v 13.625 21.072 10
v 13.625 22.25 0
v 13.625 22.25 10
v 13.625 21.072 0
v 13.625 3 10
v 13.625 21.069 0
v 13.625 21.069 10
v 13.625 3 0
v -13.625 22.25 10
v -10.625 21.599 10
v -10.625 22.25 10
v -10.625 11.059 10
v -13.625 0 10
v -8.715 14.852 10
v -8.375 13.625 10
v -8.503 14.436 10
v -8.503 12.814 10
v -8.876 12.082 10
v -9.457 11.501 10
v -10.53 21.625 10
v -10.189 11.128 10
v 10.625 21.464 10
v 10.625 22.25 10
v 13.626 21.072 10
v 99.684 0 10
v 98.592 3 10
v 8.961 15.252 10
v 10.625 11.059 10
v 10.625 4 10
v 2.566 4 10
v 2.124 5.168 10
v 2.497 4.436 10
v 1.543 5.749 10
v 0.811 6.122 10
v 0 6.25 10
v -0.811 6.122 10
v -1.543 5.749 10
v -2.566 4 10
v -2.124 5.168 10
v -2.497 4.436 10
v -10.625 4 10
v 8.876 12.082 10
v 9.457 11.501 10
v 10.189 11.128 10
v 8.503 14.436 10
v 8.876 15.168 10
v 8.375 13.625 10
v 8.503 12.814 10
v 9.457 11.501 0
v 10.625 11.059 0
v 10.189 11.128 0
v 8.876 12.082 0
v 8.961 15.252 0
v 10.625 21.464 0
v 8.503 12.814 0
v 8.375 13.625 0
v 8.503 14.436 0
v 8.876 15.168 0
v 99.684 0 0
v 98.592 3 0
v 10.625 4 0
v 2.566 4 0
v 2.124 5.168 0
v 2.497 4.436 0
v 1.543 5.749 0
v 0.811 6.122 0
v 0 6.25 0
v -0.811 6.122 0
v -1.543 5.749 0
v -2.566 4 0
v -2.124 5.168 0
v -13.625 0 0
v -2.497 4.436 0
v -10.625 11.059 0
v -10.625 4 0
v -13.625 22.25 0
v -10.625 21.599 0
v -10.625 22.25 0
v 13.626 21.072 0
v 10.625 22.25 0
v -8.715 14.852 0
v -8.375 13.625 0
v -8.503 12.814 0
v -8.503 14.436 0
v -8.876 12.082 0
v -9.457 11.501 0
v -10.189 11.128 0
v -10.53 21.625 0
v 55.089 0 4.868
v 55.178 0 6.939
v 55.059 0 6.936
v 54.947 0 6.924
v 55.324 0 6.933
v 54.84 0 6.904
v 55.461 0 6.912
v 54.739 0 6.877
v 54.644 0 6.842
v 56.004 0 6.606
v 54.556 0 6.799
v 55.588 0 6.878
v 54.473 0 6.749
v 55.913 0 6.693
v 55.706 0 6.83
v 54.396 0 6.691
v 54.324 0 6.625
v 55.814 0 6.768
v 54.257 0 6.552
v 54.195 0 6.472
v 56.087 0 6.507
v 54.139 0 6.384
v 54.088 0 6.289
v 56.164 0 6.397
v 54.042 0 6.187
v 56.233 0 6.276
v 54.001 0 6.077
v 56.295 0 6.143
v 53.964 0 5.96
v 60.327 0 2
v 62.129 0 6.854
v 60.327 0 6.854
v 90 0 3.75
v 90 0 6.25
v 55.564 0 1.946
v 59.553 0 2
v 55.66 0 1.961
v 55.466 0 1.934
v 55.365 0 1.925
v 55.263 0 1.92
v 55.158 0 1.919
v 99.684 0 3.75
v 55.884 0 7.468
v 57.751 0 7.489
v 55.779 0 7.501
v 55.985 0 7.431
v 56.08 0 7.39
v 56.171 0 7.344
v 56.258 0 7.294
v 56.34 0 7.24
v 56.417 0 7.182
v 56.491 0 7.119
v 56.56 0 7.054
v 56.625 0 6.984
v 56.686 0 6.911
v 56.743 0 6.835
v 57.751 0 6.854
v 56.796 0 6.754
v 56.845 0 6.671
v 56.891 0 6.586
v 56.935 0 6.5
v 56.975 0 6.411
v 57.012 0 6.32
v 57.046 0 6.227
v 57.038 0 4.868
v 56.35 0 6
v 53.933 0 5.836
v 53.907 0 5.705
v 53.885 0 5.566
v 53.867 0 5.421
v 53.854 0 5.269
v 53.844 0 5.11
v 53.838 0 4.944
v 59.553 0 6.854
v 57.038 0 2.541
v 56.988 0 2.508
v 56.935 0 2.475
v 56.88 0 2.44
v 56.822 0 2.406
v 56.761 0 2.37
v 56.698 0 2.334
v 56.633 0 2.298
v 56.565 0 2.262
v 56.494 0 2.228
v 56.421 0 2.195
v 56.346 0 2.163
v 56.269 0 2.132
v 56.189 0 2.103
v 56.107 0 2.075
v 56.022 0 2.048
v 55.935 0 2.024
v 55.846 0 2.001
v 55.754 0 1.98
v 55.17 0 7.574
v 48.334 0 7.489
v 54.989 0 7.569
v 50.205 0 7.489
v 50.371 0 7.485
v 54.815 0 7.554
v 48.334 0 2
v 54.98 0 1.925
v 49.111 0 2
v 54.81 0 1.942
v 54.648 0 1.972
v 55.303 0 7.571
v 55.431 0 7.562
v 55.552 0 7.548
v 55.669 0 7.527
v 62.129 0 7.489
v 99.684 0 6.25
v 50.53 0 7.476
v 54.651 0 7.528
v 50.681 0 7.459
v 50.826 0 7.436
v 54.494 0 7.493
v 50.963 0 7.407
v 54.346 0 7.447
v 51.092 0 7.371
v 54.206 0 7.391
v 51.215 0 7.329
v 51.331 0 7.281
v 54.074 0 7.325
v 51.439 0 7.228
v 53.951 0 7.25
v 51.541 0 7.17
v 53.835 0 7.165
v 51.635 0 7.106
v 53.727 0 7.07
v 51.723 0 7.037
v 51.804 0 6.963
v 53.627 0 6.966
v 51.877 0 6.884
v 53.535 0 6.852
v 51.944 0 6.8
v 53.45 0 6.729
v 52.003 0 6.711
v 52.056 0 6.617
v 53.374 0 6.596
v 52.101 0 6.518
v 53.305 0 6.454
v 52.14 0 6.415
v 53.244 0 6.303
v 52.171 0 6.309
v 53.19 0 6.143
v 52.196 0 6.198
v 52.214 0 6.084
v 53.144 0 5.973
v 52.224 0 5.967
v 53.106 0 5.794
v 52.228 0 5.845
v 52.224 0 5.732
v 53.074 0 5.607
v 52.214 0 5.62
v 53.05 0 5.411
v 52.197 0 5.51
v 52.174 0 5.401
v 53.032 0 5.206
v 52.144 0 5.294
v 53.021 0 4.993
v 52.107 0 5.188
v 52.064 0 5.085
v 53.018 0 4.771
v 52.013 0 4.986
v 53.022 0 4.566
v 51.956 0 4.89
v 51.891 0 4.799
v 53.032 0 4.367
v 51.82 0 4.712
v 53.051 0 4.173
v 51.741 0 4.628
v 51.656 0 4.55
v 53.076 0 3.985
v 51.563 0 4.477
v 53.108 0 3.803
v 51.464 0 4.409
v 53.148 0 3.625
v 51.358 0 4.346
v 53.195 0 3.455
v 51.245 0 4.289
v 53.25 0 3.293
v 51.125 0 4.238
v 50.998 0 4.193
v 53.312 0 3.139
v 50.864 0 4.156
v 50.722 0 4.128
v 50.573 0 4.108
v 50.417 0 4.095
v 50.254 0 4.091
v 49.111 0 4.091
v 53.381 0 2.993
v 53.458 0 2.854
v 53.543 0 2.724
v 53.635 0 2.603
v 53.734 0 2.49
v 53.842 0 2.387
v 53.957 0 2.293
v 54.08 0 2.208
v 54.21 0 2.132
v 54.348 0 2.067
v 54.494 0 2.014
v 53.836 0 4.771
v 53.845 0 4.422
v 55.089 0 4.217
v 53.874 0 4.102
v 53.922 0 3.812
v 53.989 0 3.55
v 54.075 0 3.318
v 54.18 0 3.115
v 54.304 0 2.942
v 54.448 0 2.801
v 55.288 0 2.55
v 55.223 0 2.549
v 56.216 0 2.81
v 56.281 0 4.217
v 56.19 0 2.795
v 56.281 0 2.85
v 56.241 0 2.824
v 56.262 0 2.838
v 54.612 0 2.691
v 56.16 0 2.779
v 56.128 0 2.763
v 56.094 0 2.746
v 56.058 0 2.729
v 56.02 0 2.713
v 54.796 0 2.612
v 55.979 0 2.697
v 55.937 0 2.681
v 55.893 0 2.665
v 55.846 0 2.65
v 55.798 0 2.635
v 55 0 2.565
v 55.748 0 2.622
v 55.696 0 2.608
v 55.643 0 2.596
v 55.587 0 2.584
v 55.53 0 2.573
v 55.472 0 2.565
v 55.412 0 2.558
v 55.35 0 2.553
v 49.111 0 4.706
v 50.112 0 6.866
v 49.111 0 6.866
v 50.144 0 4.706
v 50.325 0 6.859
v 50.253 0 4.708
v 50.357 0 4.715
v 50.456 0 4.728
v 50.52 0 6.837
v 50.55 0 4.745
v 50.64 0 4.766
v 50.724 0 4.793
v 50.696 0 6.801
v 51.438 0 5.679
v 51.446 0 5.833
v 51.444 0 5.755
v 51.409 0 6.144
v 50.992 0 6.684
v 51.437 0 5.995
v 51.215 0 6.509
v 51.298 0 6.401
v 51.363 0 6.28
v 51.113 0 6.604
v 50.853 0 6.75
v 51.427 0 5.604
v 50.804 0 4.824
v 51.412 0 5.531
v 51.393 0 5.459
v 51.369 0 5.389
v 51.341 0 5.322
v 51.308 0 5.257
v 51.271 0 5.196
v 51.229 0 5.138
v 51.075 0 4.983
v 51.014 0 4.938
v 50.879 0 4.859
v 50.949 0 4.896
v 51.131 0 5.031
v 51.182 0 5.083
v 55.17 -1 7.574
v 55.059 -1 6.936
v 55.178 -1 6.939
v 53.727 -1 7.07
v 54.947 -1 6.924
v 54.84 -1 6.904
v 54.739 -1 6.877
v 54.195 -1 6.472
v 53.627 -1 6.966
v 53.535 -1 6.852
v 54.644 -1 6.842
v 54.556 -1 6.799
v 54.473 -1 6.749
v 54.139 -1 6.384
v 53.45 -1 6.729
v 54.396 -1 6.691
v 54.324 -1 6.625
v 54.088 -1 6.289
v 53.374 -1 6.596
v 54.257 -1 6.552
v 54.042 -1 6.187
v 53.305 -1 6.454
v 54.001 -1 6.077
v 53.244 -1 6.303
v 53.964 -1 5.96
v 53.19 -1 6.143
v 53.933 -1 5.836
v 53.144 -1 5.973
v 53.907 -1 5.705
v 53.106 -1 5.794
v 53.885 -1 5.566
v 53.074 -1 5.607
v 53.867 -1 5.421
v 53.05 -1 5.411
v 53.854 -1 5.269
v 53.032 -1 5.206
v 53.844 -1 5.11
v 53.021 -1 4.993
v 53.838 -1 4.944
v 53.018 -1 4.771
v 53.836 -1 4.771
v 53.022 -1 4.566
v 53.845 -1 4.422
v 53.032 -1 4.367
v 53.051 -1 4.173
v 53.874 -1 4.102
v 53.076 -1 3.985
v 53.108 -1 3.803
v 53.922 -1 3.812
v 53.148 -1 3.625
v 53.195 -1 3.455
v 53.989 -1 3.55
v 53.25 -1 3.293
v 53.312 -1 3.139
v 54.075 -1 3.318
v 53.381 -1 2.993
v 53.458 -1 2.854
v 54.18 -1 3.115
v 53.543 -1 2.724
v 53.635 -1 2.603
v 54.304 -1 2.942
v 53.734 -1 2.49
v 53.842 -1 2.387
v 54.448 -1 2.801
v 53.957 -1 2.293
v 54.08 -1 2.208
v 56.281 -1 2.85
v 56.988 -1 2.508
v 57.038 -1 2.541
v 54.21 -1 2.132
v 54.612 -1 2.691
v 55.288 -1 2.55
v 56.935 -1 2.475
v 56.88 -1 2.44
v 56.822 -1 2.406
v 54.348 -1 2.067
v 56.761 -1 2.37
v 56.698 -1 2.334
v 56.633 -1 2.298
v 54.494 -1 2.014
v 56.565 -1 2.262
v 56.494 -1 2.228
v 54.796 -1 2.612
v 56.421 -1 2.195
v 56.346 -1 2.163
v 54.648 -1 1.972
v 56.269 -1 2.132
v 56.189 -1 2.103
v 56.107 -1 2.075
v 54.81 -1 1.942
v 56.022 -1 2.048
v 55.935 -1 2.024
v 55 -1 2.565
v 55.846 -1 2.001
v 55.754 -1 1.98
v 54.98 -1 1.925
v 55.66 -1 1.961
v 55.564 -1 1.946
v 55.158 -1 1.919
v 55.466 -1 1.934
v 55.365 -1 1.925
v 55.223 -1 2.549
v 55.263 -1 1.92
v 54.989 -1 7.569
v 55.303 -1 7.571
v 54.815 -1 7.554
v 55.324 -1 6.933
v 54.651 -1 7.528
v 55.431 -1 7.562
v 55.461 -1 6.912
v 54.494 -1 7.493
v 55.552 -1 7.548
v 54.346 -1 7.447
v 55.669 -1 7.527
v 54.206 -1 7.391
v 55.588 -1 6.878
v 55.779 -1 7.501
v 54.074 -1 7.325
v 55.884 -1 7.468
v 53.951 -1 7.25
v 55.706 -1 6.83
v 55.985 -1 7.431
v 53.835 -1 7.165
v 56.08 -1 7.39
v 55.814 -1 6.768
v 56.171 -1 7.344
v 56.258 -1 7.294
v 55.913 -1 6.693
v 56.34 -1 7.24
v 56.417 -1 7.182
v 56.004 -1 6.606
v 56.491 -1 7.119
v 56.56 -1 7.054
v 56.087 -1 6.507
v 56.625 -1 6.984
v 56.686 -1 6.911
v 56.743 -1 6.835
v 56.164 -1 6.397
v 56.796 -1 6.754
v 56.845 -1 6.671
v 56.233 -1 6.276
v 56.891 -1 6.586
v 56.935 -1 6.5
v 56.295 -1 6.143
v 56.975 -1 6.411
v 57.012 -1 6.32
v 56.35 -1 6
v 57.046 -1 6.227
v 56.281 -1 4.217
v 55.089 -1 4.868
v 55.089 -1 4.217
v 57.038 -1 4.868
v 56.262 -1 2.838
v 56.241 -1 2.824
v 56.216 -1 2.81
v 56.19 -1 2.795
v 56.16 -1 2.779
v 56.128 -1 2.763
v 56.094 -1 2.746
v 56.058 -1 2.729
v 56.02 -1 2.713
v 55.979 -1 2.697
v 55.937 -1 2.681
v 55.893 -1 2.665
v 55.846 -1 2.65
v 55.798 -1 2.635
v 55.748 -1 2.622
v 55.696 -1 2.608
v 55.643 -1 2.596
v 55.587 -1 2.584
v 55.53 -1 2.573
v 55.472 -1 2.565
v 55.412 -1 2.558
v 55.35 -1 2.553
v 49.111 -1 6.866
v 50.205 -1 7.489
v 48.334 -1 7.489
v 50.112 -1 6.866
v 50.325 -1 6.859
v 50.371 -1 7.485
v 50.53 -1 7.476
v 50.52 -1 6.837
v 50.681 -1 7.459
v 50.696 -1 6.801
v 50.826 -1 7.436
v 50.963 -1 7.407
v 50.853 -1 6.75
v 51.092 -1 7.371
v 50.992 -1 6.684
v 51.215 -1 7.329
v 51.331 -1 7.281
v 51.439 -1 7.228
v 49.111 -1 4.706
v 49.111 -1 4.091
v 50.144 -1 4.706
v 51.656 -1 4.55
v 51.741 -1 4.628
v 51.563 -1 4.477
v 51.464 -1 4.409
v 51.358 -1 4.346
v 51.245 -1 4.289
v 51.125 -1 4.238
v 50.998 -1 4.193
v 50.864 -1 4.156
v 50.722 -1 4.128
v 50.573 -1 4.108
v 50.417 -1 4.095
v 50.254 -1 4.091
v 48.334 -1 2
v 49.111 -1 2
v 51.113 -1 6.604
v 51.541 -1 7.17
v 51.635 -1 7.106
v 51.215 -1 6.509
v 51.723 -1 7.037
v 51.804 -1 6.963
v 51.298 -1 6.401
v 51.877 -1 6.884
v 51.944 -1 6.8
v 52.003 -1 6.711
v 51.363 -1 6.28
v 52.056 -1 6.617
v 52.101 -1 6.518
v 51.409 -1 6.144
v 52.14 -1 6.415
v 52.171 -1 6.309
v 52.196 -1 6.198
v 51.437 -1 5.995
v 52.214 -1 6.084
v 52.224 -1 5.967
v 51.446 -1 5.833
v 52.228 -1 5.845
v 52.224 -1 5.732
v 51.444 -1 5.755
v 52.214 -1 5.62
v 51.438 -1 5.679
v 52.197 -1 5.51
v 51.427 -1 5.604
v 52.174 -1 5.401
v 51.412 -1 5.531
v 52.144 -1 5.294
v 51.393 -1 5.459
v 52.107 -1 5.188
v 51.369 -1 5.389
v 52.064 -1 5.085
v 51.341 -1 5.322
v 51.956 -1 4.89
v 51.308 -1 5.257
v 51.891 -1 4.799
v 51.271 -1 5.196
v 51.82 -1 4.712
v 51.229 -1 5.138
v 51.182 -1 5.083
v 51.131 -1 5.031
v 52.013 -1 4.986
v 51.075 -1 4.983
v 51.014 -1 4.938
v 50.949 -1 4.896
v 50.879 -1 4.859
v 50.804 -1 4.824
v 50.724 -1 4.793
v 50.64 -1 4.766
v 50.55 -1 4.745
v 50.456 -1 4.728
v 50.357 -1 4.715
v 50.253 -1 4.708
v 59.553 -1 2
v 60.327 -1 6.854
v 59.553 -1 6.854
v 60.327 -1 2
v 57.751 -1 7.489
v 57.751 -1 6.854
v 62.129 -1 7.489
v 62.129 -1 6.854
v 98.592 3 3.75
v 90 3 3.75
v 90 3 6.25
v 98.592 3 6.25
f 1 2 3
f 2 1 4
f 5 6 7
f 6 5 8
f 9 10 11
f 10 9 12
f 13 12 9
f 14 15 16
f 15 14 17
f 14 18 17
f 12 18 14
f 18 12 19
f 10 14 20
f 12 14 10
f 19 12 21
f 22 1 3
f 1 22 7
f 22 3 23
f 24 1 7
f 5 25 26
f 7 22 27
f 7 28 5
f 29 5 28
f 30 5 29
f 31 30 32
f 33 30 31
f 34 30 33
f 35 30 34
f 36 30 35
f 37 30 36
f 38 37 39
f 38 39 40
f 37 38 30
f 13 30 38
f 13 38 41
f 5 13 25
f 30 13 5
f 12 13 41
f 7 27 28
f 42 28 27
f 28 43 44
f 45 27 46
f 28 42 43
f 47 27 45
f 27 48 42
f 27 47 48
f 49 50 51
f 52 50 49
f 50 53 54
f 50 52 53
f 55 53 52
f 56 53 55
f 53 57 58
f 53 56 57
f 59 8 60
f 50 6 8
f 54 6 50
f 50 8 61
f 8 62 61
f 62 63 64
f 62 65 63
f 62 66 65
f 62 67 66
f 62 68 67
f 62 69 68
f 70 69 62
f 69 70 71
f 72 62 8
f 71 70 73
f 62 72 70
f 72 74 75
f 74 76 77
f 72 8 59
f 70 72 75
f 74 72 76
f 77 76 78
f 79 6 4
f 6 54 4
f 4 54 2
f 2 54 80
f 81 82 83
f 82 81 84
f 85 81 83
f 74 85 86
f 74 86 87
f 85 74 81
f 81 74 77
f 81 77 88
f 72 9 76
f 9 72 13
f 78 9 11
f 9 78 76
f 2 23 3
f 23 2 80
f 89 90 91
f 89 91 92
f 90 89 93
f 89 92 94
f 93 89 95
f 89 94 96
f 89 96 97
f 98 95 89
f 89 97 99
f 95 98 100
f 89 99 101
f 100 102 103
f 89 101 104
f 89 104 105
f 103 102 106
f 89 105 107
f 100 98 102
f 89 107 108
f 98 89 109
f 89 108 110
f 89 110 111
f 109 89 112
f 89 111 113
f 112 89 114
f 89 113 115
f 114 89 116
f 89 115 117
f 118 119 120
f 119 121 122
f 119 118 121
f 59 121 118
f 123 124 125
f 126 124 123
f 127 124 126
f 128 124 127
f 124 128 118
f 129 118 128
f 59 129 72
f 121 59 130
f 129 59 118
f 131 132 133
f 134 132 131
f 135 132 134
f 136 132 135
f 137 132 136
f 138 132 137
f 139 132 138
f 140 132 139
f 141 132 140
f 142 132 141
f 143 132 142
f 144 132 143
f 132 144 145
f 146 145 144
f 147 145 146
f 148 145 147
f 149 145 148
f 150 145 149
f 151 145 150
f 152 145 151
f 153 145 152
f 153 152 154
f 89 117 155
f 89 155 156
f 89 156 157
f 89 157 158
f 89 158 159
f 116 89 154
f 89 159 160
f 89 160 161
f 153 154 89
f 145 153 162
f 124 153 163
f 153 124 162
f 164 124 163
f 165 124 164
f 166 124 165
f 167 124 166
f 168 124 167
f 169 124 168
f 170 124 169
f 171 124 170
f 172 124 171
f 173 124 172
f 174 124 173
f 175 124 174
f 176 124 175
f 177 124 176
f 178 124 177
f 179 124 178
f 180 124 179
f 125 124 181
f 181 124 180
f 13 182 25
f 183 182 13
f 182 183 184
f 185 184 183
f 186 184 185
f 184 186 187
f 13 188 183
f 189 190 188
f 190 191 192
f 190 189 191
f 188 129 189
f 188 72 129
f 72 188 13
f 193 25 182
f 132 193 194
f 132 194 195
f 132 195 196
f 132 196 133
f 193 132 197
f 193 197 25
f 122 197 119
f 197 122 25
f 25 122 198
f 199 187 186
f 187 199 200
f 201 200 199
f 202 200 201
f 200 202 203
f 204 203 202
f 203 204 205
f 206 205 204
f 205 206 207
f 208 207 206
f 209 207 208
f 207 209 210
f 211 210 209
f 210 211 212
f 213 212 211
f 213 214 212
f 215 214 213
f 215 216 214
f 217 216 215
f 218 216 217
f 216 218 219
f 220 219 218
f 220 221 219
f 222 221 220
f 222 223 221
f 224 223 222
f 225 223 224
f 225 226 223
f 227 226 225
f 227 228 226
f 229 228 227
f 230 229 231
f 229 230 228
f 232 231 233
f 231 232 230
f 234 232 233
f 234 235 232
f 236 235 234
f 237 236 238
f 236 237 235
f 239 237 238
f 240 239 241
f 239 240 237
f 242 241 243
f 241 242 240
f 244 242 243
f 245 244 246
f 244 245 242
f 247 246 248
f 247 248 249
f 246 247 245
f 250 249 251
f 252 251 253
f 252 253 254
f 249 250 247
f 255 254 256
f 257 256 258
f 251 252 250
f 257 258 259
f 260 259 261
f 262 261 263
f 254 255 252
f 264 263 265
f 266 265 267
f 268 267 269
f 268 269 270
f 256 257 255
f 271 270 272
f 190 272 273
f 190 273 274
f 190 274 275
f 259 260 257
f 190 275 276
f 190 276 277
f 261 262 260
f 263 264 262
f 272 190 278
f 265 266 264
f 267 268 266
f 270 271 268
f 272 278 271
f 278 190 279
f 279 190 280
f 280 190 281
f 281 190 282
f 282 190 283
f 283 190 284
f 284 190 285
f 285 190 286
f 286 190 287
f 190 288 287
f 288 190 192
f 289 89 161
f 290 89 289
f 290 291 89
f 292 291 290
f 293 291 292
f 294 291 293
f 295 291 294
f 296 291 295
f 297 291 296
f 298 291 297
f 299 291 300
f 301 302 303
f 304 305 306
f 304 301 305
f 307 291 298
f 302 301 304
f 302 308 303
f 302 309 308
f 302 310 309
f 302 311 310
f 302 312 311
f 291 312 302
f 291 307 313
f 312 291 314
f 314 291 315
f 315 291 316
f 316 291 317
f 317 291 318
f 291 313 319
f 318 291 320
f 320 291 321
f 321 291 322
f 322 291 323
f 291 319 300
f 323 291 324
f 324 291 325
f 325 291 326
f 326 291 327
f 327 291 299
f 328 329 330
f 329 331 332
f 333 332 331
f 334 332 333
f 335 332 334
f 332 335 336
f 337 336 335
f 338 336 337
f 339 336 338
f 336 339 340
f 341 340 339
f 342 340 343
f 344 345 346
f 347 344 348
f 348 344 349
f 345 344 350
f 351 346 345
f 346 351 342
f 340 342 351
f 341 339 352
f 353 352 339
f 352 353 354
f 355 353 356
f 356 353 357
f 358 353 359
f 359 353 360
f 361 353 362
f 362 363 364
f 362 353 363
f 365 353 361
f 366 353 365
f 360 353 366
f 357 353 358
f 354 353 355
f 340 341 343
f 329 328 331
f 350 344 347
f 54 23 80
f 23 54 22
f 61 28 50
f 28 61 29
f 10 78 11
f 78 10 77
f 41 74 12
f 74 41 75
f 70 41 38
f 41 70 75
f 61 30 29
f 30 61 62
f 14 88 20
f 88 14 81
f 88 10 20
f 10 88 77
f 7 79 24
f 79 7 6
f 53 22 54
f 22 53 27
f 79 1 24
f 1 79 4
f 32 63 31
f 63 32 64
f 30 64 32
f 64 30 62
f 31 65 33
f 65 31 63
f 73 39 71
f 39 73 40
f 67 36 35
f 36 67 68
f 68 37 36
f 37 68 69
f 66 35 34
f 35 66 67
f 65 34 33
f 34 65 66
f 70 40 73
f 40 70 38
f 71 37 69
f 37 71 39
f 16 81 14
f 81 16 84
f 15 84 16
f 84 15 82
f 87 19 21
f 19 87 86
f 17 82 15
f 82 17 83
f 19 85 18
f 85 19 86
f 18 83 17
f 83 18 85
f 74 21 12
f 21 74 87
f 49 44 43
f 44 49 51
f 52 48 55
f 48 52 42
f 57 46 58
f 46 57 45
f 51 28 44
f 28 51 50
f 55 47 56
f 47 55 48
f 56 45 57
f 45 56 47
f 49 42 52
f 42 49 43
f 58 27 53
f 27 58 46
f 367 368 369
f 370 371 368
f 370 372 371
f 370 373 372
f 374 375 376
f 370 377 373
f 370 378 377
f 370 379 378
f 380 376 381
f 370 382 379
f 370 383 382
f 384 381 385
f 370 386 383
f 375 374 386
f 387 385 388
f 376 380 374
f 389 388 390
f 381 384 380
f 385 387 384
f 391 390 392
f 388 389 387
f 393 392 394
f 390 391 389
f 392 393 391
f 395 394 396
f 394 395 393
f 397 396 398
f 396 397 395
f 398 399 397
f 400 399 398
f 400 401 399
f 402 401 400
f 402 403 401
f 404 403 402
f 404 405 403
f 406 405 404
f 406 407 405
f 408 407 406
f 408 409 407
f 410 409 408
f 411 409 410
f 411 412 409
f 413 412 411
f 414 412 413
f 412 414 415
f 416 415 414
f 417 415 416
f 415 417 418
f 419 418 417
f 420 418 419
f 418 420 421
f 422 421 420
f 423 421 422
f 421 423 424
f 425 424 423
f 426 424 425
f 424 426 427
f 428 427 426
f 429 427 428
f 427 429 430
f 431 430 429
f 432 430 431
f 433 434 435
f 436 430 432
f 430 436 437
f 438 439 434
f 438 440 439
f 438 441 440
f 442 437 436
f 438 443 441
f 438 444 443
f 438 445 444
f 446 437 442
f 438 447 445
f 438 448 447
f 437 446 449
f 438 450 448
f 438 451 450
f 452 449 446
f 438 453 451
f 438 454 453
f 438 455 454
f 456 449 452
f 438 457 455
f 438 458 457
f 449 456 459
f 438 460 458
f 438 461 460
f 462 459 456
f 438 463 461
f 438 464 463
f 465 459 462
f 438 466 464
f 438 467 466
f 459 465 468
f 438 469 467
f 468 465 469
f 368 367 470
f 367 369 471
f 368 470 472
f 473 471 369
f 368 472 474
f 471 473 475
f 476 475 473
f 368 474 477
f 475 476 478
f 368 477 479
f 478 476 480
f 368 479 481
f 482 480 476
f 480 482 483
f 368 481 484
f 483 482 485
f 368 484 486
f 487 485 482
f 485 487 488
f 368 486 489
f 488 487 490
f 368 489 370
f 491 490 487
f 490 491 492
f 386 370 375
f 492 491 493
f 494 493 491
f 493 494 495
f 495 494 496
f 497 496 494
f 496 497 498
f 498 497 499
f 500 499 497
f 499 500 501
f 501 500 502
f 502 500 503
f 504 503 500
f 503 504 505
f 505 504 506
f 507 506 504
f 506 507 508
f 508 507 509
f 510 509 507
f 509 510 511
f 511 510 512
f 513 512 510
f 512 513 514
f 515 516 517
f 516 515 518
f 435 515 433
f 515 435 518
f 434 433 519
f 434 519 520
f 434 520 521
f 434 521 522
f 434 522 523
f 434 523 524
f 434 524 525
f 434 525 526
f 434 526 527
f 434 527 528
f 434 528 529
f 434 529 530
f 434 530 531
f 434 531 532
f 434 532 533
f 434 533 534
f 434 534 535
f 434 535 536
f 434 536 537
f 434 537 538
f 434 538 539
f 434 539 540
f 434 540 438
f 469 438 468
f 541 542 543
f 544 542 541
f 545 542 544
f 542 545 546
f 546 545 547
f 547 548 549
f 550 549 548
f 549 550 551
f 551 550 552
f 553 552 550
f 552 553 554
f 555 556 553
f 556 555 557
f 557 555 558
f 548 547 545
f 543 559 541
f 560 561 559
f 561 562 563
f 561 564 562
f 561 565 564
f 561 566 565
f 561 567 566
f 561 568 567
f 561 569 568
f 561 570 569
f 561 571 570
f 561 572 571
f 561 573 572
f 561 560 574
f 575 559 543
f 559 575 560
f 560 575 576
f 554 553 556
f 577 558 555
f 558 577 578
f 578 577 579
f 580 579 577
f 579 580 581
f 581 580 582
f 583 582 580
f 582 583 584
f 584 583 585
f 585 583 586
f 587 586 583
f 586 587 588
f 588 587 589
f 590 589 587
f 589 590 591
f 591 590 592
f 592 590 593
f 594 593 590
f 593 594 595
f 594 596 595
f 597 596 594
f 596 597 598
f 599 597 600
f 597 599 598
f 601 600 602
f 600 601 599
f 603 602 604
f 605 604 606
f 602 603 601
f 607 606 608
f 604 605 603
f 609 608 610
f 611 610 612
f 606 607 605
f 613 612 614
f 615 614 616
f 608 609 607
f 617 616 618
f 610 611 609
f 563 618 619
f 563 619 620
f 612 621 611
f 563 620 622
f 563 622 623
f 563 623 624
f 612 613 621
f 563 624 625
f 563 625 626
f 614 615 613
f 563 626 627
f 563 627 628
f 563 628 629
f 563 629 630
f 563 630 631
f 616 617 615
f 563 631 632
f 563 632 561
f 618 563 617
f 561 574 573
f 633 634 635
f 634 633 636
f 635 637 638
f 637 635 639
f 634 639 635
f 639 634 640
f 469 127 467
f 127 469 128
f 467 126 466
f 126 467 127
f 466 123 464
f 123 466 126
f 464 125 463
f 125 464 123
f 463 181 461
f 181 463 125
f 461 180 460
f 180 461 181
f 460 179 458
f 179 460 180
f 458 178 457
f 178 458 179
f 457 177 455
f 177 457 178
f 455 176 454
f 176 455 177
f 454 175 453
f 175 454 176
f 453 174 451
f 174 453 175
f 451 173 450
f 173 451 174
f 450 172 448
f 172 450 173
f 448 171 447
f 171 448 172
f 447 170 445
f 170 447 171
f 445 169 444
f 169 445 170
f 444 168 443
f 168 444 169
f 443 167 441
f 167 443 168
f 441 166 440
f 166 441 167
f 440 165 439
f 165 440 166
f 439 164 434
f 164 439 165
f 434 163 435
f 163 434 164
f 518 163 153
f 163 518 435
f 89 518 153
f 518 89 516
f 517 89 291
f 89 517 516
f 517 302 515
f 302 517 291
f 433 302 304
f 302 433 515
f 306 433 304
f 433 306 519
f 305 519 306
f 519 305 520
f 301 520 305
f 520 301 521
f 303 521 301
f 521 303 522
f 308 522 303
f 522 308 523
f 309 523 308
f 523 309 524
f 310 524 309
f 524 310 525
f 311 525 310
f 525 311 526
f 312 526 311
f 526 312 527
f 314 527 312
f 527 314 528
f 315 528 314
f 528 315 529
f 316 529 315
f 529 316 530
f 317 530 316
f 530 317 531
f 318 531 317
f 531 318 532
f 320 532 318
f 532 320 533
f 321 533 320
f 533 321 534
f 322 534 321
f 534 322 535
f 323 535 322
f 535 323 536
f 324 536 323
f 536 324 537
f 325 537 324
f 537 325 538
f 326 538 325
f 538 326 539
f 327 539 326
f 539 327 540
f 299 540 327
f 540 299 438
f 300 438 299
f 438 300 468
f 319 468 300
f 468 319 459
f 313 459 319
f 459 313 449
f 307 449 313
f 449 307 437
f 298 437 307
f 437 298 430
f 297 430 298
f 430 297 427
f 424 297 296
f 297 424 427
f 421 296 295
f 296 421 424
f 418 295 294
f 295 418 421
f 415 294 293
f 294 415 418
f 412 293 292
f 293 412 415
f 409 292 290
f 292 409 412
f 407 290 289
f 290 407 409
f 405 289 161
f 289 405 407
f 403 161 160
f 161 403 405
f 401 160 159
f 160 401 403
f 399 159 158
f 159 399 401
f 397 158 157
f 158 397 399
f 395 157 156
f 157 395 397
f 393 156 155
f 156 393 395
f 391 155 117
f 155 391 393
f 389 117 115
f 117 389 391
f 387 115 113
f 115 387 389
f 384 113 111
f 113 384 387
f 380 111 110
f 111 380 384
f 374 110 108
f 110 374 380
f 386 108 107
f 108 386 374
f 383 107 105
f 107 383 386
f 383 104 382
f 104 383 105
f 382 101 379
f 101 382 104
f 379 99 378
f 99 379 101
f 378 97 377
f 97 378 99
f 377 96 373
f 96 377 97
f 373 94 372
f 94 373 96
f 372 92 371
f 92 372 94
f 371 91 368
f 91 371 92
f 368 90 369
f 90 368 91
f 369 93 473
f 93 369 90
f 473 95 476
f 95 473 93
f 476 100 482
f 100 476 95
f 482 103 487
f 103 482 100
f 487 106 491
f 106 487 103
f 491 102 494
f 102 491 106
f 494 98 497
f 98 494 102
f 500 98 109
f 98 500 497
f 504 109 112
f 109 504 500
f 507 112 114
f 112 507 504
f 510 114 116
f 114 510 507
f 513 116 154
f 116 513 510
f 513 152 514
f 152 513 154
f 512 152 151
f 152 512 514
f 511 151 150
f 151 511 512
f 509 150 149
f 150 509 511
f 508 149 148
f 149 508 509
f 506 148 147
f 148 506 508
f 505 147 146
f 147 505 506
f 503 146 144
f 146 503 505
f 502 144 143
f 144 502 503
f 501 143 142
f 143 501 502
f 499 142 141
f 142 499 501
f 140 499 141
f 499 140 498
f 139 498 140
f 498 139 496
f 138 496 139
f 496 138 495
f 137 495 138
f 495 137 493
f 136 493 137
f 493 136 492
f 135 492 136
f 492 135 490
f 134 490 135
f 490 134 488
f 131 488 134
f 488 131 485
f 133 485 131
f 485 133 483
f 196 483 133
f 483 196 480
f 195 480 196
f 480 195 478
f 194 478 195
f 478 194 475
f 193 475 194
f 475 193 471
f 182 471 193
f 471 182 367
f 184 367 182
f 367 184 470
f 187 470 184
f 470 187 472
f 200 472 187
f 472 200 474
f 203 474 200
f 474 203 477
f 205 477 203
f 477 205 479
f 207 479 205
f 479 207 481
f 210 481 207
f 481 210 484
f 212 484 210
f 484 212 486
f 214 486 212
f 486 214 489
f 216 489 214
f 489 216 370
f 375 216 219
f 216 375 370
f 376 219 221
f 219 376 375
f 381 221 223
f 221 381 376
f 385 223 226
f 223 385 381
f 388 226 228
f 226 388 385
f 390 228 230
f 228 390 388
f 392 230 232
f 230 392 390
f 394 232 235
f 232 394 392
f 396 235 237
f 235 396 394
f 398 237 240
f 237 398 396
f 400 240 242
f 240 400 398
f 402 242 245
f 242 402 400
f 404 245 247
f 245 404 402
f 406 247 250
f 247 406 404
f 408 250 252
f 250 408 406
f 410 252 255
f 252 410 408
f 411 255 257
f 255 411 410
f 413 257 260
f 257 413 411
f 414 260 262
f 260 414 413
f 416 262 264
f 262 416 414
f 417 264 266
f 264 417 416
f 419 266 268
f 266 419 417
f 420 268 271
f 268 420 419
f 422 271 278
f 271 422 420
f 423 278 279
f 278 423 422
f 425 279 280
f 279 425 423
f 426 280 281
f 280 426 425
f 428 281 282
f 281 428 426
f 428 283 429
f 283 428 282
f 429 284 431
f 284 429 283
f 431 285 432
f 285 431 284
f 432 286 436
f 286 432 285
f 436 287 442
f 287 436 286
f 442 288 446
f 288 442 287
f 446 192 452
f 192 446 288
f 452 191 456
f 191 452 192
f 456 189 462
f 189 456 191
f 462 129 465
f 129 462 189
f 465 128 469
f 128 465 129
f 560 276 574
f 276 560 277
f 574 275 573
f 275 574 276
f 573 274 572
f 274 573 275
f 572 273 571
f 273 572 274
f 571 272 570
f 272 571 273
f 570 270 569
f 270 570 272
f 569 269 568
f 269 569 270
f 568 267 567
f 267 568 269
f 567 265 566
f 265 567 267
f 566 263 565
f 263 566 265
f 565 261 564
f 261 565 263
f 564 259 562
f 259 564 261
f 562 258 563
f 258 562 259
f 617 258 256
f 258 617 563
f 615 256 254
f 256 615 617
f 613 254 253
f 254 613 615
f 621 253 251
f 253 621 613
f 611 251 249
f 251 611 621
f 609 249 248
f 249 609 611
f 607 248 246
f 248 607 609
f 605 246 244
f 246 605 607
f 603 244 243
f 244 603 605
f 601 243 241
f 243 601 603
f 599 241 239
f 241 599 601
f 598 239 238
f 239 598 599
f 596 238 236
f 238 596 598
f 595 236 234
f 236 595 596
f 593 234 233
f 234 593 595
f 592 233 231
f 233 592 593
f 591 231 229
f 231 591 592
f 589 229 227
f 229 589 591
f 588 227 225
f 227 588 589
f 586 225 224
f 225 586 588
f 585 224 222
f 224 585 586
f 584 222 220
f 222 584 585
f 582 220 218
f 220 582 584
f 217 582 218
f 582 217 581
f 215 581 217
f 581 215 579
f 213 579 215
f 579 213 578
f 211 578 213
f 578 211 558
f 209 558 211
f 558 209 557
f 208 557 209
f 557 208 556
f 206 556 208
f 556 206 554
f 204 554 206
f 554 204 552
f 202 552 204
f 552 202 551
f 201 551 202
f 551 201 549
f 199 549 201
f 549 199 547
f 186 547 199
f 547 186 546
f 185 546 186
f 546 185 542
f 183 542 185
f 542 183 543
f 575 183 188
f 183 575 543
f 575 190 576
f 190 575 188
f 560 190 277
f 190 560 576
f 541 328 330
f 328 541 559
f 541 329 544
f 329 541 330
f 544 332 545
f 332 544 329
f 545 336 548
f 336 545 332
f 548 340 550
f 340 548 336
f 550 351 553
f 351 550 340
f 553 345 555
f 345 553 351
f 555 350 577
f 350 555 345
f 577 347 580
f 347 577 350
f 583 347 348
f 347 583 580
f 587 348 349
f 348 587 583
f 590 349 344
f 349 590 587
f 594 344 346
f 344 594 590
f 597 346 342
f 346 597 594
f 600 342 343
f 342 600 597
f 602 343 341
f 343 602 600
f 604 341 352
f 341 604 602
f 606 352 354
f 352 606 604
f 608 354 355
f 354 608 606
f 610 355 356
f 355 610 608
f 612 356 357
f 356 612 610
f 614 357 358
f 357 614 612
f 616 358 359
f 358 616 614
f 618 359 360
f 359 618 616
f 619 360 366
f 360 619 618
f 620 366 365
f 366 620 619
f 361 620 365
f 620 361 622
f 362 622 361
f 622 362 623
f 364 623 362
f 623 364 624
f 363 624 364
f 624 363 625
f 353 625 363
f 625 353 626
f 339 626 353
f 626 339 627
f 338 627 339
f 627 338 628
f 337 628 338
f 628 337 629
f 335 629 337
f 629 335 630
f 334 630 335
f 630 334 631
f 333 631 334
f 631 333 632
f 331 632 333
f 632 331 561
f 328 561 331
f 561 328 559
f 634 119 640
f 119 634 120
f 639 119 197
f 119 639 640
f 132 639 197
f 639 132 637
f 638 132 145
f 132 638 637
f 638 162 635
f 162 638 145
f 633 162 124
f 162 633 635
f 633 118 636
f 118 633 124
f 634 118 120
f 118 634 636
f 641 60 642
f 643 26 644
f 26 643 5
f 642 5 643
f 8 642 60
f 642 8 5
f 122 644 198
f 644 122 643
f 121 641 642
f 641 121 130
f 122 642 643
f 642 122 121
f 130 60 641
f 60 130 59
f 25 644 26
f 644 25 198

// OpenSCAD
use <text_on.scad>;
$fn=36;

width = 27.25;
height  = 22.25;
depth  = 10.00; // seen from bird's eye view of scad file

side_wall = 3.0;

teeth_y = 20.00;    
teeth_d = 5.25; // diameter

//filament wheel has radius 85mm
protrude_length = 100; // amount to come out of 2020 bar 
support_tip_length = 10;
support_tip_space = 2.5;
support_tip_y = 3;

support_tip_head_width = 50;

font_size = 6;

translate([0,1,0]) rotate([0,0,0]) tool_clip();
// extension
//translate([width/2-1,0,0]) // -1 on x for spacing from rotate
//rotate([0,0,-20])
//union(){
//  color("blue")
//  difference(){
//    translate([protrude_length-support_tip_length,0,depth/2-support_tip_space/2])
//    union(){
//      // support that goes into slot
//      translate([0,0,0.1])
//      cube([support_tip_length,support_tip_y,support_tip_space-0.2]);
//      translate([0,0,-depth/2+support_tip_space/2])
//      // side angles up to tip
//      linear_extrude(height=depth)
//      polygon([[0,0], [support_tip_length,0], [support_tip_length+1.2,-support_tip_y]], height=10);
//
//    }
//    translate([protrude_length-support_tip_length,0,0])
//    fullTipHead();
//  }
//  translate([protrude_length-support_tip_length,0,depth/2])
//  tipHead();
  difference(){
    union(){
      translate([(protrude_length+support_tip_length)/2,0,(depth-font_size)/2])
      rotate([90,0,0])
      text_extrude("PGT",size=font_size,extrusion_height=1, center=false, halign="center");
      cube([protrude_length,3,depth]);
    }
    color("purple")
    translate([protrude_length-support_tip_length,0,depth/2-support_tip_space/2])
    cube([support_tip_length,3,support_tip_space]);
    
    translate([protrude_length-support_tip_length,0,0])
    fullTipHead();
  }
//}
module tipHead(){
  translate([7.5,6,-support_tip_head_width/2])
  rotate([90,0,20])
    difference(){
      roundedcube(8,support_tip_head_width,10,3);
      color("orange")
      translate([1,1,0])
      roundedcube(6,support_tip_head_width-2,10,3);
    }
}

module fullTipHead(){
  translate([7.5,6,-support_tip_head_width/2])
  rotate([90,0,20])
    roundedcube(8,support_tip_head_width,10,3);
}

module tool_clip()
{
  difference()
  {
    union()
    {
      color("blue") translate([-width/2,-1,0]) cube([width,height,depth]);  
    }

    union()
    {
     color("blue") translate([-width/2+side_wall,side_wall,-1]) 
     cube([width-2*side_wall,height,depth*2]);
     // cylinder(20, r=5/2,$fn=20);
   }
 }


 color("lightblue") translate([-width/2+2.3,teeth_y/2+2,0]) 
 rotate([0,0,15]) cube([3,height/2-3,depth]);  

 color("lightblue") translate([+width/2-5,teeth_y/2+3,0]) 
 rotate([0,0,-15]) cube([3,height/2-3,depth]);

 color("red")  translate([0,teeth_d/2,0]) cylinder(depth, r=teeth_d/2,$fn=20);

 color("orange")  translate([-width/2+teeth_d/2,teeth_d/2+teeth_y/2,0]) 
 cylinder(depth, r=teeth_d/2,$fn=20);
 color("orange")  translate([ width/2-teeth_d/2,teeth_d/2+teeth_y/2,0]) 
 cylinder(depth, r=teeth_d/2,$fn=20);
}

module roundedcube(xdim ,ydim ,zdim,rdim){
  hull(){
    translate([rdim,rdim,0]) cylinder(h=zdim,r=rdim);
    translate([xdim-rdim,rdim,0])cylinder(h=zdim,r=rdim);

    translate([rdim,ydim-rdim,0])cylinder(h=zdim,r=rdim);
    translate([xdim-rdim,ydim-rdim,0])cylinder(h=zdim,r=rdim);
  }
}
